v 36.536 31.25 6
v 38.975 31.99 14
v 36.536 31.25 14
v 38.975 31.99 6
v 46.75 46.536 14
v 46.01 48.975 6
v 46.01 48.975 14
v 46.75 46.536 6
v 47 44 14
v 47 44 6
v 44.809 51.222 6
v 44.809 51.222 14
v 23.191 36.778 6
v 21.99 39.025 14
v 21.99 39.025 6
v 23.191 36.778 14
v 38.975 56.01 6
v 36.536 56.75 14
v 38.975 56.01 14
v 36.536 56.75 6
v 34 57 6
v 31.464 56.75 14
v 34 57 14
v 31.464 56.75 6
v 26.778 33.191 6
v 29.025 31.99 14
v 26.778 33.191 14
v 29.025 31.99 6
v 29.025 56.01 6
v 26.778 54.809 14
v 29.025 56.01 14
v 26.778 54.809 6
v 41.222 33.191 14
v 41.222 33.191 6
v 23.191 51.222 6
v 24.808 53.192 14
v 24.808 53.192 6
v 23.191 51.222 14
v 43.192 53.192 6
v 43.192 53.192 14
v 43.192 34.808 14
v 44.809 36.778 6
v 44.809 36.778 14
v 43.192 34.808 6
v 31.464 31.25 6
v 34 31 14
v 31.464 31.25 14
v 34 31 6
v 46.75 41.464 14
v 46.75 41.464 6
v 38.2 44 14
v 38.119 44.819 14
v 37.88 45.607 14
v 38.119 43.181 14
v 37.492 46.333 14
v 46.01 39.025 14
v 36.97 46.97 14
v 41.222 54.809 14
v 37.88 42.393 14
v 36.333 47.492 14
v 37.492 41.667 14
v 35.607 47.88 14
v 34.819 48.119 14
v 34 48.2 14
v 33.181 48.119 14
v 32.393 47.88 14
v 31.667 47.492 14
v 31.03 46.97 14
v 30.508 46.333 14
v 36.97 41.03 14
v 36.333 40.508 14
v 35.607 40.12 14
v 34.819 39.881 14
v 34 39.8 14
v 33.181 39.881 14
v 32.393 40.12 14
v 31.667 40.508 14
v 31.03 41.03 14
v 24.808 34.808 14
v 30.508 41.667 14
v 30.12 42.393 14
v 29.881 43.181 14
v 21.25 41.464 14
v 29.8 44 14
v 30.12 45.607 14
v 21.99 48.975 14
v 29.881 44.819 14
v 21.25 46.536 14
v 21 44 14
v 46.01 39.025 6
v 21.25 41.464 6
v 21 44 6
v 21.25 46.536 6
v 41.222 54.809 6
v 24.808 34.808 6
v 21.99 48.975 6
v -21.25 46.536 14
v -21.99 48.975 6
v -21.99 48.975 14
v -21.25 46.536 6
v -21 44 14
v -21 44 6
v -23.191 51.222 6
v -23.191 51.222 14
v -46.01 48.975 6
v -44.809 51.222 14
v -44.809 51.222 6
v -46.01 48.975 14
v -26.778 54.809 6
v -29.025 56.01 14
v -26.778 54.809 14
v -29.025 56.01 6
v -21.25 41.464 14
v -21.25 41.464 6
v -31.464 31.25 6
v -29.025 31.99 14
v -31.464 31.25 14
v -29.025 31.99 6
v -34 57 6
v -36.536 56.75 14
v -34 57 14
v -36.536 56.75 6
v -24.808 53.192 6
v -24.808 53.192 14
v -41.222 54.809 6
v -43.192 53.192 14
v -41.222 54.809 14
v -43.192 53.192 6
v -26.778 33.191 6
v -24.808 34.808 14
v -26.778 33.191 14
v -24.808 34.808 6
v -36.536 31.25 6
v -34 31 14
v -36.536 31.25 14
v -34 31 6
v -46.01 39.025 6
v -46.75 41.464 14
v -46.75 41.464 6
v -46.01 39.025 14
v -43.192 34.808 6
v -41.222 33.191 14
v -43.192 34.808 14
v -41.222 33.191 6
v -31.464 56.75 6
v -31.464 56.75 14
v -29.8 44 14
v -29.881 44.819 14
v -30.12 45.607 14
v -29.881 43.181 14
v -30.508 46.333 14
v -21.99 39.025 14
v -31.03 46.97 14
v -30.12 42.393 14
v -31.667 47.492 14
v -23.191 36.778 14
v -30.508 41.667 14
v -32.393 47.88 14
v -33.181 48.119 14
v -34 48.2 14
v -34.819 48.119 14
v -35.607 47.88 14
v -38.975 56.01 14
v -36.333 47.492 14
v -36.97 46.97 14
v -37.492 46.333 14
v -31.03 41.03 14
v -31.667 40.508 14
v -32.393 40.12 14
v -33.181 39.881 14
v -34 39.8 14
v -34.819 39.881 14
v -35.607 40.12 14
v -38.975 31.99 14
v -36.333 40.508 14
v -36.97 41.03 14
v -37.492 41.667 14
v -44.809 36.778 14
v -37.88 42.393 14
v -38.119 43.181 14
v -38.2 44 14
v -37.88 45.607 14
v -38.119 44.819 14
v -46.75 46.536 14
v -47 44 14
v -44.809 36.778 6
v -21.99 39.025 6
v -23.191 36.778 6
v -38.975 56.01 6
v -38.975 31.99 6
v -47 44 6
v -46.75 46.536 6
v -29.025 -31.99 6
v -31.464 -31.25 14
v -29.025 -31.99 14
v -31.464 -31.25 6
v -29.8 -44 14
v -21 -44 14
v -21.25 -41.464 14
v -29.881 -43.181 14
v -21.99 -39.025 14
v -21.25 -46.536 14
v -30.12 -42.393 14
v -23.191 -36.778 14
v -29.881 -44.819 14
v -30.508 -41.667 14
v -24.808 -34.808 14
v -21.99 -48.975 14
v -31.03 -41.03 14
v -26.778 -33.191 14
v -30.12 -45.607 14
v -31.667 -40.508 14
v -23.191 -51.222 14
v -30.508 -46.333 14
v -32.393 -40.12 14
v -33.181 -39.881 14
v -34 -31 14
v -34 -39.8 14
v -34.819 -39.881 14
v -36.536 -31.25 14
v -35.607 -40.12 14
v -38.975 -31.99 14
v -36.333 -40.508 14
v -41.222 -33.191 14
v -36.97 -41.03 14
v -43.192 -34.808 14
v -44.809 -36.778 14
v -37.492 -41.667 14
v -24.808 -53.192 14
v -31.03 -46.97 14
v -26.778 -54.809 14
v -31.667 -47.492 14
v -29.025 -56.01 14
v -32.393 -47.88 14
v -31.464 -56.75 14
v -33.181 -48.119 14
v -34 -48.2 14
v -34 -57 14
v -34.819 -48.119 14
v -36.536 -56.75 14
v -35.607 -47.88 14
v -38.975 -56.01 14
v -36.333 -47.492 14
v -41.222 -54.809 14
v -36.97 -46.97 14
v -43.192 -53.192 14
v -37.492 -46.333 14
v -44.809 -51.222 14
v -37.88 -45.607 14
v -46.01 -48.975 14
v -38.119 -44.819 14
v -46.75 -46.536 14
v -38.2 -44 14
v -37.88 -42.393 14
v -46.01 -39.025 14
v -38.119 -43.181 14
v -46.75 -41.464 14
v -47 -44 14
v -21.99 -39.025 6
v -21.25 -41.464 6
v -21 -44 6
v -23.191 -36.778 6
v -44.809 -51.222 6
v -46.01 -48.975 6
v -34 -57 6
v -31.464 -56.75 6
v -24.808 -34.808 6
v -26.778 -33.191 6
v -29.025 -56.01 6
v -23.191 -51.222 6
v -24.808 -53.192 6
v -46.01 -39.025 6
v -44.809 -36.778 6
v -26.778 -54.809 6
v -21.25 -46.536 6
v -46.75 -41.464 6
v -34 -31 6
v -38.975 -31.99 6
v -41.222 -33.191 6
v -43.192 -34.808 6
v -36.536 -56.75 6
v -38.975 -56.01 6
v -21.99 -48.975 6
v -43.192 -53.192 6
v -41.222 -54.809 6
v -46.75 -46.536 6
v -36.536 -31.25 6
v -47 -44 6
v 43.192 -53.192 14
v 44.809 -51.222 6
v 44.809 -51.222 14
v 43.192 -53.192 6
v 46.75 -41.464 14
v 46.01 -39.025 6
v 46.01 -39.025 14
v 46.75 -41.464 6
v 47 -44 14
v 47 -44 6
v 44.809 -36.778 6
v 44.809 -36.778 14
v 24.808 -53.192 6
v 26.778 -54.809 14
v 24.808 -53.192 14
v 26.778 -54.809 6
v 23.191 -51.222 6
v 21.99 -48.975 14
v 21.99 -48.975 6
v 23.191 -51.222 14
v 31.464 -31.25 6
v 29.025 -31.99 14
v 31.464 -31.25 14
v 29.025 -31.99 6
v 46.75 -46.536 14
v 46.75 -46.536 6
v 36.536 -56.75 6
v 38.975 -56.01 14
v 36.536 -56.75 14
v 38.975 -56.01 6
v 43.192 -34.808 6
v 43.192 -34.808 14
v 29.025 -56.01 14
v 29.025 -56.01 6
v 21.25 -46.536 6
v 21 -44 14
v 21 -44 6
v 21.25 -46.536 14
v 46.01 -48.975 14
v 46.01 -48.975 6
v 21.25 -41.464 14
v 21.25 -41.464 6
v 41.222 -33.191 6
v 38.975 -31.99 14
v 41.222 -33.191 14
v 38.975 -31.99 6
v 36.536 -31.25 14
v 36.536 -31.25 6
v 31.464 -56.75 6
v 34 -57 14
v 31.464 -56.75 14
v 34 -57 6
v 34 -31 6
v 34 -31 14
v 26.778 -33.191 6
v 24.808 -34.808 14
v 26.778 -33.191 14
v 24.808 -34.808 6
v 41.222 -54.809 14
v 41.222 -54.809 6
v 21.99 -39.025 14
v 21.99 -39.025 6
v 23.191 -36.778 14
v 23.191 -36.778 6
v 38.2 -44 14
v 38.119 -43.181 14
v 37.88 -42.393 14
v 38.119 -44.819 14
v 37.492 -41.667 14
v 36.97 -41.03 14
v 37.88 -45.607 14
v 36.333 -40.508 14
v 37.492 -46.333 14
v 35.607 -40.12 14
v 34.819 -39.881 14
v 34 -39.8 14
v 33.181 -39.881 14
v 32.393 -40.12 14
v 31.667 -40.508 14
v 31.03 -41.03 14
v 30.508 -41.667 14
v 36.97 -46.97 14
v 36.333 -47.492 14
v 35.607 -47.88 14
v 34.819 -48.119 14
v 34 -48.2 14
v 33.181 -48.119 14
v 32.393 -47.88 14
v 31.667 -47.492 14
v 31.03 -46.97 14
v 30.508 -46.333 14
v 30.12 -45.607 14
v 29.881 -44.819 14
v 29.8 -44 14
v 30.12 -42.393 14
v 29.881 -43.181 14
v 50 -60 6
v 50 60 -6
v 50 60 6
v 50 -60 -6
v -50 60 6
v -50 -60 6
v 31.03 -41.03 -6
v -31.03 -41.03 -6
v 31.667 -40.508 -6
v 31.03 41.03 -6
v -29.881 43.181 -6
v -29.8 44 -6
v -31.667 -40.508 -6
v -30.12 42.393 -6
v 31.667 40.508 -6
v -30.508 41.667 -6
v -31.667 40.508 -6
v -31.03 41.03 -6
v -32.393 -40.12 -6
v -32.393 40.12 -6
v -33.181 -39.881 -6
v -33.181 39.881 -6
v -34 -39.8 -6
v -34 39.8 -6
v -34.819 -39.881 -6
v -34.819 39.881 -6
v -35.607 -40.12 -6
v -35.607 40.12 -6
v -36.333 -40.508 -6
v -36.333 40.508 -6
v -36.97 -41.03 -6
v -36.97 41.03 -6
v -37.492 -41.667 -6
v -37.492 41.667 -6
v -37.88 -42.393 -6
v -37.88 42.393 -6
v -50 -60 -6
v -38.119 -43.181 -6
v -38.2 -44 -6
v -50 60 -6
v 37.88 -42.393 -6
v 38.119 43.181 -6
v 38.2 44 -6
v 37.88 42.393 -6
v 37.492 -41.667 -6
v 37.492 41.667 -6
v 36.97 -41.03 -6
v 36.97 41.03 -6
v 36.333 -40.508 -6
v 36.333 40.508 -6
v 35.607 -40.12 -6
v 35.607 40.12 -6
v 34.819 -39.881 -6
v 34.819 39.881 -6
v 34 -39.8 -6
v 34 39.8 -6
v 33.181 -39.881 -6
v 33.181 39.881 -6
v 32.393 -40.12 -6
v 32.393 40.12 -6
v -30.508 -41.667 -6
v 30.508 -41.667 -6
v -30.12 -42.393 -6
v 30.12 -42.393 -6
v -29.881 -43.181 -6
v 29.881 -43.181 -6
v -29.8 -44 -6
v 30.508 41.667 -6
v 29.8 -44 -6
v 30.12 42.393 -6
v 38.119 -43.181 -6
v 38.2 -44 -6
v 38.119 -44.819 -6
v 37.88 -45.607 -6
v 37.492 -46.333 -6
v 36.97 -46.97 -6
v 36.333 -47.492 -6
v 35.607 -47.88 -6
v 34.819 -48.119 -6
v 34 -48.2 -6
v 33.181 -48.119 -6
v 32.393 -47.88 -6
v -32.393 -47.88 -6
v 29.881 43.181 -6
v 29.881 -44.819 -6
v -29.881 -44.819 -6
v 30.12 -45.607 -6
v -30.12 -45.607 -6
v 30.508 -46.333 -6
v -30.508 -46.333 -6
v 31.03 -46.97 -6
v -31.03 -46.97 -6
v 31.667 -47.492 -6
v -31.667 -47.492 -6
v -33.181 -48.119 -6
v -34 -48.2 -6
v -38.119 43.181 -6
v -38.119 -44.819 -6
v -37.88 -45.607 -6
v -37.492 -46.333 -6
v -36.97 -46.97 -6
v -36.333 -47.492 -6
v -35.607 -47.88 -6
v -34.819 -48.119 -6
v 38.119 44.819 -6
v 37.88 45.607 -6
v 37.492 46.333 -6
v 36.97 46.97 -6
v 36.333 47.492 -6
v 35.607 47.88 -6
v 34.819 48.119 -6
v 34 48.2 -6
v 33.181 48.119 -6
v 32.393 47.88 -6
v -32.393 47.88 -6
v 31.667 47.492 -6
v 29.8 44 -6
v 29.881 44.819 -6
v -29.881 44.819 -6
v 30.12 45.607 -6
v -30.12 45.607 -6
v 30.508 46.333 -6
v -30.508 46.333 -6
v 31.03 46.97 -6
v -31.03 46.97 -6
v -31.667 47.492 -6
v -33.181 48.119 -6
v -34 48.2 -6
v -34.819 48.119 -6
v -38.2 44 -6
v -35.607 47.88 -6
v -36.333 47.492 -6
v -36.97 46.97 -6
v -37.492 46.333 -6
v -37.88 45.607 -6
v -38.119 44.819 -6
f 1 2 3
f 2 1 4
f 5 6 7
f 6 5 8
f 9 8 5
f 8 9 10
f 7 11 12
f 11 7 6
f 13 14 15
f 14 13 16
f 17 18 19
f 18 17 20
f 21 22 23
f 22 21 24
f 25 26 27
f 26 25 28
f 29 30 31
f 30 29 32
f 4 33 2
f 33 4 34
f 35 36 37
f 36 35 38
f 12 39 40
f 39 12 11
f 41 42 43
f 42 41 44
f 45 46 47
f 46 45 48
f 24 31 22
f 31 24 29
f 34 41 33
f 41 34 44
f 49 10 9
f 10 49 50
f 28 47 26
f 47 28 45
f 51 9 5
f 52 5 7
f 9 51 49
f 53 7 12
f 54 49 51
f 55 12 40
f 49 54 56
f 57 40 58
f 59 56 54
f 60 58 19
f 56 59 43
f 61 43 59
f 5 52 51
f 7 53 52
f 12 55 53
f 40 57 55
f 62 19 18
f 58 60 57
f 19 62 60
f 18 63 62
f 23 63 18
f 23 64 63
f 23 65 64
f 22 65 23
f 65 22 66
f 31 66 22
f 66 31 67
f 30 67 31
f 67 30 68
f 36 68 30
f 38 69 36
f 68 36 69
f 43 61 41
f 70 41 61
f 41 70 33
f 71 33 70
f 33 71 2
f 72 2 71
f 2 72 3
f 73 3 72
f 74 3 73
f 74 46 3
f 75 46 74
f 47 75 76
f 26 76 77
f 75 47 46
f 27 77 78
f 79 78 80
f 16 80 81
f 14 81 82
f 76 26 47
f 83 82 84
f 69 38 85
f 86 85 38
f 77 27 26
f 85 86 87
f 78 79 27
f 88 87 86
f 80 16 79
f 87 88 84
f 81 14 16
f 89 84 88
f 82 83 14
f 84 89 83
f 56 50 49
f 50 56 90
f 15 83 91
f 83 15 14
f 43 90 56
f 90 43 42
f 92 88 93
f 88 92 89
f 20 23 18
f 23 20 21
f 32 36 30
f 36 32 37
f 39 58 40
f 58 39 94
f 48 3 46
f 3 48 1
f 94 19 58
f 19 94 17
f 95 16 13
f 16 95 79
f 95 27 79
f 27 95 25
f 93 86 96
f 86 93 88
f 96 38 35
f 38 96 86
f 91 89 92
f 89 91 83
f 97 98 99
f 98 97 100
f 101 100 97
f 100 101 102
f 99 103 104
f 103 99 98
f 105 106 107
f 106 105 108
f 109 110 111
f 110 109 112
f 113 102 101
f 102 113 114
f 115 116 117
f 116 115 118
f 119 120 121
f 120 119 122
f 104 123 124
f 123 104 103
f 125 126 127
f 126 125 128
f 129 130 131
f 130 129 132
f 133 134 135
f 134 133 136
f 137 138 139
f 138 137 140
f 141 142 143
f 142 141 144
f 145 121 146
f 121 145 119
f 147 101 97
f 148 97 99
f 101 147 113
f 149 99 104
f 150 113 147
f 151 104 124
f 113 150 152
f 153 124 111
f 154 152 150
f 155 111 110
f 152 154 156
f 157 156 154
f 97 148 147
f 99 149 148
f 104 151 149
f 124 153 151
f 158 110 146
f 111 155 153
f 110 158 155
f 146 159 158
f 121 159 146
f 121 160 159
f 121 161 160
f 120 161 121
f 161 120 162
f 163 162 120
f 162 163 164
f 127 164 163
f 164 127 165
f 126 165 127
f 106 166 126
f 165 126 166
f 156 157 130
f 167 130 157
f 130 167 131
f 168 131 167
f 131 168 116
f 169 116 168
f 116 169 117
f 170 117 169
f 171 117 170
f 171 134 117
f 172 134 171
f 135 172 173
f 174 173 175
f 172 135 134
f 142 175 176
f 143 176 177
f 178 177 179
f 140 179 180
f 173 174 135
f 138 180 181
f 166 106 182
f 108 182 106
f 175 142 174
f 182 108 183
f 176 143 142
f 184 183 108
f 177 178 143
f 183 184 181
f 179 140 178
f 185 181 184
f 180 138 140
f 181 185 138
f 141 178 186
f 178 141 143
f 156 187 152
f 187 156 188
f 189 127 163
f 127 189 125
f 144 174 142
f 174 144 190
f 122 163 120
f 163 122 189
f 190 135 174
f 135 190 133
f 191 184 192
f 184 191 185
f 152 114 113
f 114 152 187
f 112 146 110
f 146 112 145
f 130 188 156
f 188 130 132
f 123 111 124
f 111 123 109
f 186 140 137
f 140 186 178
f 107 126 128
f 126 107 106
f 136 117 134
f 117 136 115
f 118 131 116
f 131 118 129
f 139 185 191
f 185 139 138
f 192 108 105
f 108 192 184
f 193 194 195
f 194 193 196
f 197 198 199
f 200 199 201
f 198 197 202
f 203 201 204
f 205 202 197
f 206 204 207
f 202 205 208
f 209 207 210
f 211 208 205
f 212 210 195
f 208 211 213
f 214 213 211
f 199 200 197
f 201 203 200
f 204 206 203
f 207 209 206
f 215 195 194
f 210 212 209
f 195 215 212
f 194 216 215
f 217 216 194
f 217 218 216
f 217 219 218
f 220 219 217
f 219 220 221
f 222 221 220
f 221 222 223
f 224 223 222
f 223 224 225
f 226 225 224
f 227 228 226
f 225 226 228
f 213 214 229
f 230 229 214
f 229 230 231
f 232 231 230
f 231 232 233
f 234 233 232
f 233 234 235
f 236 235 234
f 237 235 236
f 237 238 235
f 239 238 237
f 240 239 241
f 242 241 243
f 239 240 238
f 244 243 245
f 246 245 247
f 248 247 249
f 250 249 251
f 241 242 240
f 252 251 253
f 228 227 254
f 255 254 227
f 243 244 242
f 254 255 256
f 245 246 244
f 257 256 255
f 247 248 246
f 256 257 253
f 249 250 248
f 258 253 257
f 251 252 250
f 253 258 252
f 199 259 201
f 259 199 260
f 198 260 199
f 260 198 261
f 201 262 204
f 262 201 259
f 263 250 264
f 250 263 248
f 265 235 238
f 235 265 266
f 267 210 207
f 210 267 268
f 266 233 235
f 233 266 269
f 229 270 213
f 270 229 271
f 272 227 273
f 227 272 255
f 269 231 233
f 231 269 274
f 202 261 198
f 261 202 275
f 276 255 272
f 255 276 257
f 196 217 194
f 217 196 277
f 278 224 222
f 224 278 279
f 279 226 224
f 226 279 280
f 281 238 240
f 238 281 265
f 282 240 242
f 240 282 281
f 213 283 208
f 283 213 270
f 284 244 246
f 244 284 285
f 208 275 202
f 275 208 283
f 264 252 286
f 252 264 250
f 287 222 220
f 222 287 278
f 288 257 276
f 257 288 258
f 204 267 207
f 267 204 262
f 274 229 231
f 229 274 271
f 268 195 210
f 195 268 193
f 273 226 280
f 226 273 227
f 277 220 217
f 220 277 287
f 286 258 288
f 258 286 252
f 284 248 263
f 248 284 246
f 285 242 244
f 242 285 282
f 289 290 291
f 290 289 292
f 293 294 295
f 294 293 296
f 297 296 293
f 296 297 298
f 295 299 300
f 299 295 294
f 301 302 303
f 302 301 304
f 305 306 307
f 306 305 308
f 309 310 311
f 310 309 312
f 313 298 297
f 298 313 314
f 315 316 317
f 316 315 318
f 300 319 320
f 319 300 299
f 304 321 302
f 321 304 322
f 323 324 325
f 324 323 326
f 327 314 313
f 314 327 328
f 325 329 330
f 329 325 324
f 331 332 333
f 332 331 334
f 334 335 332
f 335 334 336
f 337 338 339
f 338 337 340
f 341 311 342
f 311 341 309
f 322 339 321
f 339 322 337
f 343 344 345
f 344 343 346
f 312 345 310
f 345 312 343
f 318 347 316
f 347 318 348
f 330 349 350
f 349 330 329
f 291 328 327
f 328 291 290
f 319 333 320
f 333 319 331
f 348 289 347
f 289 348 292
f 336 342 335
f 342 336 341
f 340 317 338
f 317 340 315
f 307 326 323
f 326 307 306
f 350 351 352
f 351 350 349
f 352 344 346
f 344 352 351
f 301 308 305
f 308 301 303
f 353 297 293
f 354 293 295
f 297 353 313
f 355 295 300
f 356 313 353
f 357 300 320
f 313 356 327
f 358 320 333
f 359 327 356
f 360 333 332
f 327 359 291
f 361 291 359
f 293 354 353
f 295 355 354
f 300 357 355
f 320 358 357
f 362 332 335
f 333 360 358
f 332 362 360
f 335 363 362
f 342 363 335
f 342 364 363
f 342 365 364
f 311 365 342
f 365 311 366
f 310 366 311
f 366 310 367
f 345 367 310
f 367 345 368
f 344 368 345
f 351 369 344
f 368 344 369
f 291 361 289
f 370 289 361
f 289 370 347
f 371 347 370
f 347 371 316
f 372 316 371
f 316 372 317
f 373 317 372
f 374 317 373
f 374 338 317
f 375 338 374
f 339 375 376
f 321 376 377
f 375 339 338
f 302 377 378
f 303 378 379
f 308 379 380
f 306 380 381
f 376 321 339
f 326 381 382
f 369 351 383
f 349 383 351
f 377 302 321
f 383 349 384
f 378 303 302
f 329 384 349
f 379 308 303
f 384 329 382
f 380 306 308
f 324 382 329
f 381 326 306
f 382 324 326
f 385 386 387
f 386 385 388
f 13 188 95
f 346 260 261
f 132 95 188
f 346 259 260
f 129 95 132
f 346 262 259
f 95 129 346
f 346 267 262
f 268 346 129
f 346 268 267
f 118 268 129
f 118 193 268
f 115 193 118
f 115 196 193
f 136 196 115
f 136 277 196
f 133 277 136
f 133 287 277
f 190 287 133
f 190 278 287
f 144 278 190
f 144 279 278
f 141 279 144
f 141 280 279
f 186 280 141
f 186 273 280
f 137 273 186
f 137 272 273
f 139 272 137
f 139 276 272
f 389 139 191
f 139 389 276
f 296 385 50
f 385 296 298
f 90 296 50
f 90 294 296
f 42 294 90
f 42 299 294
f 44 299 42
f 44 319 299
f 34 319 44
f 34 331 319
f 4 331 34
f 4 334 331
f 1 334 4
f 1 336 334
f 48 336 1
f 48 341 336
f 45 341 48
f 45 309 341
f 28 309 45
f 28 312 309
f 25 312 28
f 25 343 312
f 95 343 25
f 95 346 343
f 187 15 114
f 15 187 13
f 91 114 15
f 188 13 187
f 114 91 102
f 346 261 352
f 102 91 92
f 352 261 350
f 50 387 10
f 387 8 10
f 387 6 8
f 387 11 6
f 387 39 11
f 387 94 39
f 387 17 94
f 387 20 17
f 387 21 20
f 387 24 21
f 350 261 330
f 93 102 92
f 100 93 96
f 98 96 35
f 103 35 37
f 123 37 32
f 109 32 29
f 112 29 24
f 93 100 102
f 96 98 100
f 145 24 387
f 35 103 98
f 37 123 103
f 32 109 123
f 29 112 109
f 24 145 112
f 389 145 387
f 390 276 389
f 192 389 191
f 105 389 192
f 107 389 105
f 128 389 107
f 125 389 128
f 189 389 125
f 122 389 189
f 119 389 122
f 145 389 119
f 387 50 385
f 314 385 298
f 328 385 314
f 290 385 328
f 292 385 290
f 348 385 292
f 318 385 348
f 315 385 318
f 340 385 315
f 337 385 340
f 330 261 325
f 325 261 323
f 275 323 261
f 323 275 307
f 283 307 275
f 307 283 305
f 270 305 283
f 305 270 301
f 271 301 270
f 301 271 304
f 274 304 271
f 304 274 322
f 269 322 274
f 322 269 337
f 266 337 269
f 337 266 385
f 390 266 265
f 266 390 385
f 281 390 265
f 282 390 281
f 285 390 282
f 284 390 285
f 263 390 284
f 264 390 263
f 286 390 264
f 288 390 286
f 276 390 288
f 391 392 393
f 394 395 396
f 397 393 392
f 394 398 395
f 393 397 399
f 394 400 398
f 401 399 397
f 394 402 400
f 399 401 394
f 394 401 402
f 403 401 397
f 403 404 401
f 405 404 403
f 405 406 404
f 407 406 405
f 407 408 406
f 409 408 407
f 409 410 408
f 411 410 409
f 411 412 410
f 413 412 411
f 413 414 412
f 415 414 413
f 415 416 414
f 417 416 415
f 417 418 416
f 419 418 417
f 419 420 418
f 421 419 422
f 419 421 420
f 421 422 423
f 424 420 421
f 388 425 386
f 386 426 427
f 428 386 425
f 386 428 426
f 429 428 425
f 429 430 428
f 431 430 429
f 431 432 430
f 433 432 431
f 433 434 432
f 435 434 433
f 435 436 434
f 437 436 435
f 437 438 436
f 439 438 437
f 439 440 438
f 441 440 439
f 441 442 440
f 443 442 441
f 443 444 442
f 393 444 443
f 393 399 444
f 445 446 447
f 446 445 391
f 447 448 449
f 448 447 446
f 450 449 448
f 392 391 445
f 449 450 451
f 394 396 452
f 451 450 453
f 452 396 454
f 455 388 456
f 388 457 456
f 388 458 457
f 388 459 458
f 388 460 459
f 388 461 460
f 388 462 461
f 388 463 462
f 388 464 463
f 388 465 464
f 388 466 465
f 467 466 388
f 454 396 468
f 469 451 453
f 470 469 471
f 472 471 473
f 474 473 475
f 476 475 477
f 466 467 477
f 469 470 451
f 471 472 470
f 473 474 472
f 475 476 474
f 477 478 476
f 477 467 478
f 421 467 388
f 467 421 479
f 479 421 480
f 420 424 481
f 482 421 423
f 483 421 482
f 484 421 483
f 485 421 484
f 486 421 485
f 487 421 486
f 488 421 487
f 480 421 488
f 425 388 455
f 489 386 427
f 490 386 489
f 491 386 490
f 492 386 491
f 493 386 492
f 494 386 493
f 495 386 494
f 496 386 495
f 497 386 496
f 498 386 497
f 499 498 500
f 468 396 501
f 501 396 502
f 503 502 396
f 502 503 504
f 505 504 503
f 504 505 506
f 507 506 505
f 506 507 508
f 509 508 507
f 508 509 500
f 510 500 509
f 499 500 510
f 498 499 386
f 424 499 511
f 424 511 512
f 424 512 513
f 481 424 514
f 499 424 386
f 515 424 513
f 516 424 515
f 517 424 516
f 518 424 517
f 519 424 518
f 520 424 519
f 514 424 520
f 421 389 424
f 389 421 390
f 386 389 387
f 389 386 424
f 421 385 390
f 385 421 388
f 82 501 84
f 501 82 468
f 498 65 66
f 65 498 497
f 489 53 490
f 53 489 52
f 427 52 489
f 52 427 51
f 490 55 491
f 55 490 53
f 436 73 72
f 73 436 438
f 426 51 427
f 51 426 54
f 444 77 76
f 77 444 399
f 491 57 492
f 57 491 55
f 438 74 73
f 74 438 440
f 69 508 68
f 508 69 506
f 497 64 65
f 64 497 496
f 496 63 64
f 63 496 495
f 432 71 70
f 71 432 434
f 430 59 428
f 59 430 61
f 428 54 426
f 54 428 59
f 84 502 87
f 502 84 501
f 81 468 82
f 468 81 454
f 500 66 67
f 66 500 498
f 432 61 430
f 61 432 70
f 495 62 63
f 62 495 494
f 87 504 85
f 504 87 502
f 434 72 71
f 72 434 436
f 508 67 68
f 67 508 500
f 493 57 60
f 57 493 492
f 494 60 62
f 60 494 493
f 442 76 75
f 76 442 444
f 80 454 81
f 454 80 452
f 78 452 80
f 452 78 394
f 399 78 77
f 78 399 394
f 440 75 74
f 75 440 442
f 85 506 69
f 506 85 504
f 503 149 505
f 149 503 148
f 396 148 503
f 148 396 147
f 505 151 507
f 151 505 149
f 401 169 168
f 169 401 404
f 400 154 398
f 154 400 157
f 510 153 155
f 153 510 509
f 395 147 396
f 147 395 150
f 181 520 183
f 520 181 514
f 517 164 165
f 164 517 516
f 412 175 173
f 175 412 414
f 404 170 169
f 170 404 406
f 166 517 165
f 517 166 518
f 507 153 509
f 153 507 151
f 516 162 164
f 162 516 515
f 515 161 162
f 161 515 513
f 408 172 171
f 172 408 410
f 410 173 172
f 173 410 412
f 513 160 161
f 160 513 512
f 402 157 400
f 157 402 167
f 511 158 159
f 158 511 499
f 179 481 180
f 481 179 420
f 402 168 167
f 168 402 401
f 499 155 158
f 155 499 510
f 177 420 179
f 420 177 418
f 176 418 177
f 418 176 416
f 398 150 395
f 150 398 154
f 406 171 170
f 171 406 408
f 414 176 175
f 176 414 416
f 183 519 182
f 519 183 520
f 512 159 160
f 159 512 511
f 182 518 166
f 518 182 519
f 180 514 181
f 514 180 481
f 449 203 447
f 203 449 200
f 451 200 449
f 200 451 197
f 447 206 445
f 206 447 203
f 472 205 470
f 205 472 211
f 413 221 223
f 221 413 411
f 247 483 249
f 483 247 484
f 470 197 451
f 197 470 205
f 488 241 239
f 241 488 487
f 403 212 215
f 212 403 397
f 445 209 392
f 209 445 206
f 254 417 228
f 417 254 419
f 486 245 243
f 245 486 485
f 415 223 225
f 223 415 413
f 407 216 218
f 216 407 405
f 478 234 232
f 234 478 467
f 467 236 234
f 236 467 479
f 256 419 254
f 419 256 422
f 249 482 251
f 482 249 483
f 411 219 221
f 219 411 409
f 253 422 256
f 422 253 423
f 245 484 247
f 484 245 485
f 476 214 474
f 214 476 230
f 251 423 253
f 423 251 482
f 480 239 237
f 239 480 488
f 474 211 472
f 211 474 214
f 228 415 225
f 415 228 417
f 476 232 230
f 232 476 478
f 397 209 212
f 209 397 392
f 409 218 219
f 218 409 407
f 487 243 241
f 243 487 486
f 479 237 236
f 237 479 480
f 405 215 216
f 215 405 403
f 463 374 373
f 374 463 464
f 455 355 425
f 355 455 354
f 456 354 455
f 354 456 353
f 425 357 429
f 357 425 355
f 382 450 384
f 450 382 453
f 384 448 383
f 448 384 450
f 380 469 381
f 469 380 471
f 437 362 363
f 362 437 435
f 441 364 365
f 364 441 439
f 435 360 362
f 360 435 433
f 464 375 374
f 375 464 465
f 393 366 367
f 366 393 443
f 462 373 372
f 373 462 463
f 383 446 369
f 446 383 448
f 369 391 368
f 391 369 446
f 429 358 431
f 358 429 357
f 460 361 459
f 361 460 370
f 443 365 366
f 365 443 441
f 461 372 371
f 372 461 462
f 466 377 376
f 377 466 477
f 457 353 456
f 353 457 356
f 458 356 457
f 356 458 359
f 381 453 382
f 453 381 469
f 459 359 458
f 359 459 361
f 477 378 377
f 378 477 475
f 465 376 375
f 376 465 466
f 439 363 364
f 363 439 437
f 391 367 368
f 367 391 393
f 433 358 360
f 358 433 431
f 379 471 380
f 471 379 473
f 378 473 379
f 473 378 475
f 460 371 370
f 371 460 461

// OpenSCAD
$fn = 32;

// ----------------------------------------------------------------------
// Anchor pads 100 x 120 x 20
// four corner bosses with anchor holes
// ----------------------------------------------------------------------

// --- parameters (mm) ---
plate = [100, 120, 12];  // base plate size (x, y, z)
seat_tol = 0.1;          // tolerance at the seating features
free_tol = 0.3;          // general tolerance on the free sizes
pads = 4;                // boss count, one per corner
edge = 16;               // boss centre offset from the plate edge
boss_d = 26;             // boss diameter
boss_h = 8;              // boss height above the base plate
hole_d = 8.4;            // hole diameter

// --- derived feature positions (mm) ---
height = plate[2] + boss_h;      // = 20   overall height of the part
corner_x = plate[0] / 2 - edge;  // = 34   boss centre X
corner_y = plate[1] / 2 - edge;  // = 44   boss centre Y
feature_centers = [
  [corner_x, corner_y],
  [-corner_x, corner_y],
  [-corner_x, -corner_y],
  [corner_x, -corner_y]
];   // boss centres, anchor holes are drilled there

// base plate, four bosses standing on it, anchor holes all the way through
difference() {
  union() {
    cube(plate, center = true);
    for (centre = feature_centers)
      translate([centre[0], centre[1], plate[2] / 2 - 1])
        cylinder(d = boss_d, h = boss_h + 1);
  }
  for (centre = feature_centers)
    translate([centre[0], centre[1], -height])
      cylinder(d = hole_d, h = 2 * height + 2);  // through boss and plate
}
